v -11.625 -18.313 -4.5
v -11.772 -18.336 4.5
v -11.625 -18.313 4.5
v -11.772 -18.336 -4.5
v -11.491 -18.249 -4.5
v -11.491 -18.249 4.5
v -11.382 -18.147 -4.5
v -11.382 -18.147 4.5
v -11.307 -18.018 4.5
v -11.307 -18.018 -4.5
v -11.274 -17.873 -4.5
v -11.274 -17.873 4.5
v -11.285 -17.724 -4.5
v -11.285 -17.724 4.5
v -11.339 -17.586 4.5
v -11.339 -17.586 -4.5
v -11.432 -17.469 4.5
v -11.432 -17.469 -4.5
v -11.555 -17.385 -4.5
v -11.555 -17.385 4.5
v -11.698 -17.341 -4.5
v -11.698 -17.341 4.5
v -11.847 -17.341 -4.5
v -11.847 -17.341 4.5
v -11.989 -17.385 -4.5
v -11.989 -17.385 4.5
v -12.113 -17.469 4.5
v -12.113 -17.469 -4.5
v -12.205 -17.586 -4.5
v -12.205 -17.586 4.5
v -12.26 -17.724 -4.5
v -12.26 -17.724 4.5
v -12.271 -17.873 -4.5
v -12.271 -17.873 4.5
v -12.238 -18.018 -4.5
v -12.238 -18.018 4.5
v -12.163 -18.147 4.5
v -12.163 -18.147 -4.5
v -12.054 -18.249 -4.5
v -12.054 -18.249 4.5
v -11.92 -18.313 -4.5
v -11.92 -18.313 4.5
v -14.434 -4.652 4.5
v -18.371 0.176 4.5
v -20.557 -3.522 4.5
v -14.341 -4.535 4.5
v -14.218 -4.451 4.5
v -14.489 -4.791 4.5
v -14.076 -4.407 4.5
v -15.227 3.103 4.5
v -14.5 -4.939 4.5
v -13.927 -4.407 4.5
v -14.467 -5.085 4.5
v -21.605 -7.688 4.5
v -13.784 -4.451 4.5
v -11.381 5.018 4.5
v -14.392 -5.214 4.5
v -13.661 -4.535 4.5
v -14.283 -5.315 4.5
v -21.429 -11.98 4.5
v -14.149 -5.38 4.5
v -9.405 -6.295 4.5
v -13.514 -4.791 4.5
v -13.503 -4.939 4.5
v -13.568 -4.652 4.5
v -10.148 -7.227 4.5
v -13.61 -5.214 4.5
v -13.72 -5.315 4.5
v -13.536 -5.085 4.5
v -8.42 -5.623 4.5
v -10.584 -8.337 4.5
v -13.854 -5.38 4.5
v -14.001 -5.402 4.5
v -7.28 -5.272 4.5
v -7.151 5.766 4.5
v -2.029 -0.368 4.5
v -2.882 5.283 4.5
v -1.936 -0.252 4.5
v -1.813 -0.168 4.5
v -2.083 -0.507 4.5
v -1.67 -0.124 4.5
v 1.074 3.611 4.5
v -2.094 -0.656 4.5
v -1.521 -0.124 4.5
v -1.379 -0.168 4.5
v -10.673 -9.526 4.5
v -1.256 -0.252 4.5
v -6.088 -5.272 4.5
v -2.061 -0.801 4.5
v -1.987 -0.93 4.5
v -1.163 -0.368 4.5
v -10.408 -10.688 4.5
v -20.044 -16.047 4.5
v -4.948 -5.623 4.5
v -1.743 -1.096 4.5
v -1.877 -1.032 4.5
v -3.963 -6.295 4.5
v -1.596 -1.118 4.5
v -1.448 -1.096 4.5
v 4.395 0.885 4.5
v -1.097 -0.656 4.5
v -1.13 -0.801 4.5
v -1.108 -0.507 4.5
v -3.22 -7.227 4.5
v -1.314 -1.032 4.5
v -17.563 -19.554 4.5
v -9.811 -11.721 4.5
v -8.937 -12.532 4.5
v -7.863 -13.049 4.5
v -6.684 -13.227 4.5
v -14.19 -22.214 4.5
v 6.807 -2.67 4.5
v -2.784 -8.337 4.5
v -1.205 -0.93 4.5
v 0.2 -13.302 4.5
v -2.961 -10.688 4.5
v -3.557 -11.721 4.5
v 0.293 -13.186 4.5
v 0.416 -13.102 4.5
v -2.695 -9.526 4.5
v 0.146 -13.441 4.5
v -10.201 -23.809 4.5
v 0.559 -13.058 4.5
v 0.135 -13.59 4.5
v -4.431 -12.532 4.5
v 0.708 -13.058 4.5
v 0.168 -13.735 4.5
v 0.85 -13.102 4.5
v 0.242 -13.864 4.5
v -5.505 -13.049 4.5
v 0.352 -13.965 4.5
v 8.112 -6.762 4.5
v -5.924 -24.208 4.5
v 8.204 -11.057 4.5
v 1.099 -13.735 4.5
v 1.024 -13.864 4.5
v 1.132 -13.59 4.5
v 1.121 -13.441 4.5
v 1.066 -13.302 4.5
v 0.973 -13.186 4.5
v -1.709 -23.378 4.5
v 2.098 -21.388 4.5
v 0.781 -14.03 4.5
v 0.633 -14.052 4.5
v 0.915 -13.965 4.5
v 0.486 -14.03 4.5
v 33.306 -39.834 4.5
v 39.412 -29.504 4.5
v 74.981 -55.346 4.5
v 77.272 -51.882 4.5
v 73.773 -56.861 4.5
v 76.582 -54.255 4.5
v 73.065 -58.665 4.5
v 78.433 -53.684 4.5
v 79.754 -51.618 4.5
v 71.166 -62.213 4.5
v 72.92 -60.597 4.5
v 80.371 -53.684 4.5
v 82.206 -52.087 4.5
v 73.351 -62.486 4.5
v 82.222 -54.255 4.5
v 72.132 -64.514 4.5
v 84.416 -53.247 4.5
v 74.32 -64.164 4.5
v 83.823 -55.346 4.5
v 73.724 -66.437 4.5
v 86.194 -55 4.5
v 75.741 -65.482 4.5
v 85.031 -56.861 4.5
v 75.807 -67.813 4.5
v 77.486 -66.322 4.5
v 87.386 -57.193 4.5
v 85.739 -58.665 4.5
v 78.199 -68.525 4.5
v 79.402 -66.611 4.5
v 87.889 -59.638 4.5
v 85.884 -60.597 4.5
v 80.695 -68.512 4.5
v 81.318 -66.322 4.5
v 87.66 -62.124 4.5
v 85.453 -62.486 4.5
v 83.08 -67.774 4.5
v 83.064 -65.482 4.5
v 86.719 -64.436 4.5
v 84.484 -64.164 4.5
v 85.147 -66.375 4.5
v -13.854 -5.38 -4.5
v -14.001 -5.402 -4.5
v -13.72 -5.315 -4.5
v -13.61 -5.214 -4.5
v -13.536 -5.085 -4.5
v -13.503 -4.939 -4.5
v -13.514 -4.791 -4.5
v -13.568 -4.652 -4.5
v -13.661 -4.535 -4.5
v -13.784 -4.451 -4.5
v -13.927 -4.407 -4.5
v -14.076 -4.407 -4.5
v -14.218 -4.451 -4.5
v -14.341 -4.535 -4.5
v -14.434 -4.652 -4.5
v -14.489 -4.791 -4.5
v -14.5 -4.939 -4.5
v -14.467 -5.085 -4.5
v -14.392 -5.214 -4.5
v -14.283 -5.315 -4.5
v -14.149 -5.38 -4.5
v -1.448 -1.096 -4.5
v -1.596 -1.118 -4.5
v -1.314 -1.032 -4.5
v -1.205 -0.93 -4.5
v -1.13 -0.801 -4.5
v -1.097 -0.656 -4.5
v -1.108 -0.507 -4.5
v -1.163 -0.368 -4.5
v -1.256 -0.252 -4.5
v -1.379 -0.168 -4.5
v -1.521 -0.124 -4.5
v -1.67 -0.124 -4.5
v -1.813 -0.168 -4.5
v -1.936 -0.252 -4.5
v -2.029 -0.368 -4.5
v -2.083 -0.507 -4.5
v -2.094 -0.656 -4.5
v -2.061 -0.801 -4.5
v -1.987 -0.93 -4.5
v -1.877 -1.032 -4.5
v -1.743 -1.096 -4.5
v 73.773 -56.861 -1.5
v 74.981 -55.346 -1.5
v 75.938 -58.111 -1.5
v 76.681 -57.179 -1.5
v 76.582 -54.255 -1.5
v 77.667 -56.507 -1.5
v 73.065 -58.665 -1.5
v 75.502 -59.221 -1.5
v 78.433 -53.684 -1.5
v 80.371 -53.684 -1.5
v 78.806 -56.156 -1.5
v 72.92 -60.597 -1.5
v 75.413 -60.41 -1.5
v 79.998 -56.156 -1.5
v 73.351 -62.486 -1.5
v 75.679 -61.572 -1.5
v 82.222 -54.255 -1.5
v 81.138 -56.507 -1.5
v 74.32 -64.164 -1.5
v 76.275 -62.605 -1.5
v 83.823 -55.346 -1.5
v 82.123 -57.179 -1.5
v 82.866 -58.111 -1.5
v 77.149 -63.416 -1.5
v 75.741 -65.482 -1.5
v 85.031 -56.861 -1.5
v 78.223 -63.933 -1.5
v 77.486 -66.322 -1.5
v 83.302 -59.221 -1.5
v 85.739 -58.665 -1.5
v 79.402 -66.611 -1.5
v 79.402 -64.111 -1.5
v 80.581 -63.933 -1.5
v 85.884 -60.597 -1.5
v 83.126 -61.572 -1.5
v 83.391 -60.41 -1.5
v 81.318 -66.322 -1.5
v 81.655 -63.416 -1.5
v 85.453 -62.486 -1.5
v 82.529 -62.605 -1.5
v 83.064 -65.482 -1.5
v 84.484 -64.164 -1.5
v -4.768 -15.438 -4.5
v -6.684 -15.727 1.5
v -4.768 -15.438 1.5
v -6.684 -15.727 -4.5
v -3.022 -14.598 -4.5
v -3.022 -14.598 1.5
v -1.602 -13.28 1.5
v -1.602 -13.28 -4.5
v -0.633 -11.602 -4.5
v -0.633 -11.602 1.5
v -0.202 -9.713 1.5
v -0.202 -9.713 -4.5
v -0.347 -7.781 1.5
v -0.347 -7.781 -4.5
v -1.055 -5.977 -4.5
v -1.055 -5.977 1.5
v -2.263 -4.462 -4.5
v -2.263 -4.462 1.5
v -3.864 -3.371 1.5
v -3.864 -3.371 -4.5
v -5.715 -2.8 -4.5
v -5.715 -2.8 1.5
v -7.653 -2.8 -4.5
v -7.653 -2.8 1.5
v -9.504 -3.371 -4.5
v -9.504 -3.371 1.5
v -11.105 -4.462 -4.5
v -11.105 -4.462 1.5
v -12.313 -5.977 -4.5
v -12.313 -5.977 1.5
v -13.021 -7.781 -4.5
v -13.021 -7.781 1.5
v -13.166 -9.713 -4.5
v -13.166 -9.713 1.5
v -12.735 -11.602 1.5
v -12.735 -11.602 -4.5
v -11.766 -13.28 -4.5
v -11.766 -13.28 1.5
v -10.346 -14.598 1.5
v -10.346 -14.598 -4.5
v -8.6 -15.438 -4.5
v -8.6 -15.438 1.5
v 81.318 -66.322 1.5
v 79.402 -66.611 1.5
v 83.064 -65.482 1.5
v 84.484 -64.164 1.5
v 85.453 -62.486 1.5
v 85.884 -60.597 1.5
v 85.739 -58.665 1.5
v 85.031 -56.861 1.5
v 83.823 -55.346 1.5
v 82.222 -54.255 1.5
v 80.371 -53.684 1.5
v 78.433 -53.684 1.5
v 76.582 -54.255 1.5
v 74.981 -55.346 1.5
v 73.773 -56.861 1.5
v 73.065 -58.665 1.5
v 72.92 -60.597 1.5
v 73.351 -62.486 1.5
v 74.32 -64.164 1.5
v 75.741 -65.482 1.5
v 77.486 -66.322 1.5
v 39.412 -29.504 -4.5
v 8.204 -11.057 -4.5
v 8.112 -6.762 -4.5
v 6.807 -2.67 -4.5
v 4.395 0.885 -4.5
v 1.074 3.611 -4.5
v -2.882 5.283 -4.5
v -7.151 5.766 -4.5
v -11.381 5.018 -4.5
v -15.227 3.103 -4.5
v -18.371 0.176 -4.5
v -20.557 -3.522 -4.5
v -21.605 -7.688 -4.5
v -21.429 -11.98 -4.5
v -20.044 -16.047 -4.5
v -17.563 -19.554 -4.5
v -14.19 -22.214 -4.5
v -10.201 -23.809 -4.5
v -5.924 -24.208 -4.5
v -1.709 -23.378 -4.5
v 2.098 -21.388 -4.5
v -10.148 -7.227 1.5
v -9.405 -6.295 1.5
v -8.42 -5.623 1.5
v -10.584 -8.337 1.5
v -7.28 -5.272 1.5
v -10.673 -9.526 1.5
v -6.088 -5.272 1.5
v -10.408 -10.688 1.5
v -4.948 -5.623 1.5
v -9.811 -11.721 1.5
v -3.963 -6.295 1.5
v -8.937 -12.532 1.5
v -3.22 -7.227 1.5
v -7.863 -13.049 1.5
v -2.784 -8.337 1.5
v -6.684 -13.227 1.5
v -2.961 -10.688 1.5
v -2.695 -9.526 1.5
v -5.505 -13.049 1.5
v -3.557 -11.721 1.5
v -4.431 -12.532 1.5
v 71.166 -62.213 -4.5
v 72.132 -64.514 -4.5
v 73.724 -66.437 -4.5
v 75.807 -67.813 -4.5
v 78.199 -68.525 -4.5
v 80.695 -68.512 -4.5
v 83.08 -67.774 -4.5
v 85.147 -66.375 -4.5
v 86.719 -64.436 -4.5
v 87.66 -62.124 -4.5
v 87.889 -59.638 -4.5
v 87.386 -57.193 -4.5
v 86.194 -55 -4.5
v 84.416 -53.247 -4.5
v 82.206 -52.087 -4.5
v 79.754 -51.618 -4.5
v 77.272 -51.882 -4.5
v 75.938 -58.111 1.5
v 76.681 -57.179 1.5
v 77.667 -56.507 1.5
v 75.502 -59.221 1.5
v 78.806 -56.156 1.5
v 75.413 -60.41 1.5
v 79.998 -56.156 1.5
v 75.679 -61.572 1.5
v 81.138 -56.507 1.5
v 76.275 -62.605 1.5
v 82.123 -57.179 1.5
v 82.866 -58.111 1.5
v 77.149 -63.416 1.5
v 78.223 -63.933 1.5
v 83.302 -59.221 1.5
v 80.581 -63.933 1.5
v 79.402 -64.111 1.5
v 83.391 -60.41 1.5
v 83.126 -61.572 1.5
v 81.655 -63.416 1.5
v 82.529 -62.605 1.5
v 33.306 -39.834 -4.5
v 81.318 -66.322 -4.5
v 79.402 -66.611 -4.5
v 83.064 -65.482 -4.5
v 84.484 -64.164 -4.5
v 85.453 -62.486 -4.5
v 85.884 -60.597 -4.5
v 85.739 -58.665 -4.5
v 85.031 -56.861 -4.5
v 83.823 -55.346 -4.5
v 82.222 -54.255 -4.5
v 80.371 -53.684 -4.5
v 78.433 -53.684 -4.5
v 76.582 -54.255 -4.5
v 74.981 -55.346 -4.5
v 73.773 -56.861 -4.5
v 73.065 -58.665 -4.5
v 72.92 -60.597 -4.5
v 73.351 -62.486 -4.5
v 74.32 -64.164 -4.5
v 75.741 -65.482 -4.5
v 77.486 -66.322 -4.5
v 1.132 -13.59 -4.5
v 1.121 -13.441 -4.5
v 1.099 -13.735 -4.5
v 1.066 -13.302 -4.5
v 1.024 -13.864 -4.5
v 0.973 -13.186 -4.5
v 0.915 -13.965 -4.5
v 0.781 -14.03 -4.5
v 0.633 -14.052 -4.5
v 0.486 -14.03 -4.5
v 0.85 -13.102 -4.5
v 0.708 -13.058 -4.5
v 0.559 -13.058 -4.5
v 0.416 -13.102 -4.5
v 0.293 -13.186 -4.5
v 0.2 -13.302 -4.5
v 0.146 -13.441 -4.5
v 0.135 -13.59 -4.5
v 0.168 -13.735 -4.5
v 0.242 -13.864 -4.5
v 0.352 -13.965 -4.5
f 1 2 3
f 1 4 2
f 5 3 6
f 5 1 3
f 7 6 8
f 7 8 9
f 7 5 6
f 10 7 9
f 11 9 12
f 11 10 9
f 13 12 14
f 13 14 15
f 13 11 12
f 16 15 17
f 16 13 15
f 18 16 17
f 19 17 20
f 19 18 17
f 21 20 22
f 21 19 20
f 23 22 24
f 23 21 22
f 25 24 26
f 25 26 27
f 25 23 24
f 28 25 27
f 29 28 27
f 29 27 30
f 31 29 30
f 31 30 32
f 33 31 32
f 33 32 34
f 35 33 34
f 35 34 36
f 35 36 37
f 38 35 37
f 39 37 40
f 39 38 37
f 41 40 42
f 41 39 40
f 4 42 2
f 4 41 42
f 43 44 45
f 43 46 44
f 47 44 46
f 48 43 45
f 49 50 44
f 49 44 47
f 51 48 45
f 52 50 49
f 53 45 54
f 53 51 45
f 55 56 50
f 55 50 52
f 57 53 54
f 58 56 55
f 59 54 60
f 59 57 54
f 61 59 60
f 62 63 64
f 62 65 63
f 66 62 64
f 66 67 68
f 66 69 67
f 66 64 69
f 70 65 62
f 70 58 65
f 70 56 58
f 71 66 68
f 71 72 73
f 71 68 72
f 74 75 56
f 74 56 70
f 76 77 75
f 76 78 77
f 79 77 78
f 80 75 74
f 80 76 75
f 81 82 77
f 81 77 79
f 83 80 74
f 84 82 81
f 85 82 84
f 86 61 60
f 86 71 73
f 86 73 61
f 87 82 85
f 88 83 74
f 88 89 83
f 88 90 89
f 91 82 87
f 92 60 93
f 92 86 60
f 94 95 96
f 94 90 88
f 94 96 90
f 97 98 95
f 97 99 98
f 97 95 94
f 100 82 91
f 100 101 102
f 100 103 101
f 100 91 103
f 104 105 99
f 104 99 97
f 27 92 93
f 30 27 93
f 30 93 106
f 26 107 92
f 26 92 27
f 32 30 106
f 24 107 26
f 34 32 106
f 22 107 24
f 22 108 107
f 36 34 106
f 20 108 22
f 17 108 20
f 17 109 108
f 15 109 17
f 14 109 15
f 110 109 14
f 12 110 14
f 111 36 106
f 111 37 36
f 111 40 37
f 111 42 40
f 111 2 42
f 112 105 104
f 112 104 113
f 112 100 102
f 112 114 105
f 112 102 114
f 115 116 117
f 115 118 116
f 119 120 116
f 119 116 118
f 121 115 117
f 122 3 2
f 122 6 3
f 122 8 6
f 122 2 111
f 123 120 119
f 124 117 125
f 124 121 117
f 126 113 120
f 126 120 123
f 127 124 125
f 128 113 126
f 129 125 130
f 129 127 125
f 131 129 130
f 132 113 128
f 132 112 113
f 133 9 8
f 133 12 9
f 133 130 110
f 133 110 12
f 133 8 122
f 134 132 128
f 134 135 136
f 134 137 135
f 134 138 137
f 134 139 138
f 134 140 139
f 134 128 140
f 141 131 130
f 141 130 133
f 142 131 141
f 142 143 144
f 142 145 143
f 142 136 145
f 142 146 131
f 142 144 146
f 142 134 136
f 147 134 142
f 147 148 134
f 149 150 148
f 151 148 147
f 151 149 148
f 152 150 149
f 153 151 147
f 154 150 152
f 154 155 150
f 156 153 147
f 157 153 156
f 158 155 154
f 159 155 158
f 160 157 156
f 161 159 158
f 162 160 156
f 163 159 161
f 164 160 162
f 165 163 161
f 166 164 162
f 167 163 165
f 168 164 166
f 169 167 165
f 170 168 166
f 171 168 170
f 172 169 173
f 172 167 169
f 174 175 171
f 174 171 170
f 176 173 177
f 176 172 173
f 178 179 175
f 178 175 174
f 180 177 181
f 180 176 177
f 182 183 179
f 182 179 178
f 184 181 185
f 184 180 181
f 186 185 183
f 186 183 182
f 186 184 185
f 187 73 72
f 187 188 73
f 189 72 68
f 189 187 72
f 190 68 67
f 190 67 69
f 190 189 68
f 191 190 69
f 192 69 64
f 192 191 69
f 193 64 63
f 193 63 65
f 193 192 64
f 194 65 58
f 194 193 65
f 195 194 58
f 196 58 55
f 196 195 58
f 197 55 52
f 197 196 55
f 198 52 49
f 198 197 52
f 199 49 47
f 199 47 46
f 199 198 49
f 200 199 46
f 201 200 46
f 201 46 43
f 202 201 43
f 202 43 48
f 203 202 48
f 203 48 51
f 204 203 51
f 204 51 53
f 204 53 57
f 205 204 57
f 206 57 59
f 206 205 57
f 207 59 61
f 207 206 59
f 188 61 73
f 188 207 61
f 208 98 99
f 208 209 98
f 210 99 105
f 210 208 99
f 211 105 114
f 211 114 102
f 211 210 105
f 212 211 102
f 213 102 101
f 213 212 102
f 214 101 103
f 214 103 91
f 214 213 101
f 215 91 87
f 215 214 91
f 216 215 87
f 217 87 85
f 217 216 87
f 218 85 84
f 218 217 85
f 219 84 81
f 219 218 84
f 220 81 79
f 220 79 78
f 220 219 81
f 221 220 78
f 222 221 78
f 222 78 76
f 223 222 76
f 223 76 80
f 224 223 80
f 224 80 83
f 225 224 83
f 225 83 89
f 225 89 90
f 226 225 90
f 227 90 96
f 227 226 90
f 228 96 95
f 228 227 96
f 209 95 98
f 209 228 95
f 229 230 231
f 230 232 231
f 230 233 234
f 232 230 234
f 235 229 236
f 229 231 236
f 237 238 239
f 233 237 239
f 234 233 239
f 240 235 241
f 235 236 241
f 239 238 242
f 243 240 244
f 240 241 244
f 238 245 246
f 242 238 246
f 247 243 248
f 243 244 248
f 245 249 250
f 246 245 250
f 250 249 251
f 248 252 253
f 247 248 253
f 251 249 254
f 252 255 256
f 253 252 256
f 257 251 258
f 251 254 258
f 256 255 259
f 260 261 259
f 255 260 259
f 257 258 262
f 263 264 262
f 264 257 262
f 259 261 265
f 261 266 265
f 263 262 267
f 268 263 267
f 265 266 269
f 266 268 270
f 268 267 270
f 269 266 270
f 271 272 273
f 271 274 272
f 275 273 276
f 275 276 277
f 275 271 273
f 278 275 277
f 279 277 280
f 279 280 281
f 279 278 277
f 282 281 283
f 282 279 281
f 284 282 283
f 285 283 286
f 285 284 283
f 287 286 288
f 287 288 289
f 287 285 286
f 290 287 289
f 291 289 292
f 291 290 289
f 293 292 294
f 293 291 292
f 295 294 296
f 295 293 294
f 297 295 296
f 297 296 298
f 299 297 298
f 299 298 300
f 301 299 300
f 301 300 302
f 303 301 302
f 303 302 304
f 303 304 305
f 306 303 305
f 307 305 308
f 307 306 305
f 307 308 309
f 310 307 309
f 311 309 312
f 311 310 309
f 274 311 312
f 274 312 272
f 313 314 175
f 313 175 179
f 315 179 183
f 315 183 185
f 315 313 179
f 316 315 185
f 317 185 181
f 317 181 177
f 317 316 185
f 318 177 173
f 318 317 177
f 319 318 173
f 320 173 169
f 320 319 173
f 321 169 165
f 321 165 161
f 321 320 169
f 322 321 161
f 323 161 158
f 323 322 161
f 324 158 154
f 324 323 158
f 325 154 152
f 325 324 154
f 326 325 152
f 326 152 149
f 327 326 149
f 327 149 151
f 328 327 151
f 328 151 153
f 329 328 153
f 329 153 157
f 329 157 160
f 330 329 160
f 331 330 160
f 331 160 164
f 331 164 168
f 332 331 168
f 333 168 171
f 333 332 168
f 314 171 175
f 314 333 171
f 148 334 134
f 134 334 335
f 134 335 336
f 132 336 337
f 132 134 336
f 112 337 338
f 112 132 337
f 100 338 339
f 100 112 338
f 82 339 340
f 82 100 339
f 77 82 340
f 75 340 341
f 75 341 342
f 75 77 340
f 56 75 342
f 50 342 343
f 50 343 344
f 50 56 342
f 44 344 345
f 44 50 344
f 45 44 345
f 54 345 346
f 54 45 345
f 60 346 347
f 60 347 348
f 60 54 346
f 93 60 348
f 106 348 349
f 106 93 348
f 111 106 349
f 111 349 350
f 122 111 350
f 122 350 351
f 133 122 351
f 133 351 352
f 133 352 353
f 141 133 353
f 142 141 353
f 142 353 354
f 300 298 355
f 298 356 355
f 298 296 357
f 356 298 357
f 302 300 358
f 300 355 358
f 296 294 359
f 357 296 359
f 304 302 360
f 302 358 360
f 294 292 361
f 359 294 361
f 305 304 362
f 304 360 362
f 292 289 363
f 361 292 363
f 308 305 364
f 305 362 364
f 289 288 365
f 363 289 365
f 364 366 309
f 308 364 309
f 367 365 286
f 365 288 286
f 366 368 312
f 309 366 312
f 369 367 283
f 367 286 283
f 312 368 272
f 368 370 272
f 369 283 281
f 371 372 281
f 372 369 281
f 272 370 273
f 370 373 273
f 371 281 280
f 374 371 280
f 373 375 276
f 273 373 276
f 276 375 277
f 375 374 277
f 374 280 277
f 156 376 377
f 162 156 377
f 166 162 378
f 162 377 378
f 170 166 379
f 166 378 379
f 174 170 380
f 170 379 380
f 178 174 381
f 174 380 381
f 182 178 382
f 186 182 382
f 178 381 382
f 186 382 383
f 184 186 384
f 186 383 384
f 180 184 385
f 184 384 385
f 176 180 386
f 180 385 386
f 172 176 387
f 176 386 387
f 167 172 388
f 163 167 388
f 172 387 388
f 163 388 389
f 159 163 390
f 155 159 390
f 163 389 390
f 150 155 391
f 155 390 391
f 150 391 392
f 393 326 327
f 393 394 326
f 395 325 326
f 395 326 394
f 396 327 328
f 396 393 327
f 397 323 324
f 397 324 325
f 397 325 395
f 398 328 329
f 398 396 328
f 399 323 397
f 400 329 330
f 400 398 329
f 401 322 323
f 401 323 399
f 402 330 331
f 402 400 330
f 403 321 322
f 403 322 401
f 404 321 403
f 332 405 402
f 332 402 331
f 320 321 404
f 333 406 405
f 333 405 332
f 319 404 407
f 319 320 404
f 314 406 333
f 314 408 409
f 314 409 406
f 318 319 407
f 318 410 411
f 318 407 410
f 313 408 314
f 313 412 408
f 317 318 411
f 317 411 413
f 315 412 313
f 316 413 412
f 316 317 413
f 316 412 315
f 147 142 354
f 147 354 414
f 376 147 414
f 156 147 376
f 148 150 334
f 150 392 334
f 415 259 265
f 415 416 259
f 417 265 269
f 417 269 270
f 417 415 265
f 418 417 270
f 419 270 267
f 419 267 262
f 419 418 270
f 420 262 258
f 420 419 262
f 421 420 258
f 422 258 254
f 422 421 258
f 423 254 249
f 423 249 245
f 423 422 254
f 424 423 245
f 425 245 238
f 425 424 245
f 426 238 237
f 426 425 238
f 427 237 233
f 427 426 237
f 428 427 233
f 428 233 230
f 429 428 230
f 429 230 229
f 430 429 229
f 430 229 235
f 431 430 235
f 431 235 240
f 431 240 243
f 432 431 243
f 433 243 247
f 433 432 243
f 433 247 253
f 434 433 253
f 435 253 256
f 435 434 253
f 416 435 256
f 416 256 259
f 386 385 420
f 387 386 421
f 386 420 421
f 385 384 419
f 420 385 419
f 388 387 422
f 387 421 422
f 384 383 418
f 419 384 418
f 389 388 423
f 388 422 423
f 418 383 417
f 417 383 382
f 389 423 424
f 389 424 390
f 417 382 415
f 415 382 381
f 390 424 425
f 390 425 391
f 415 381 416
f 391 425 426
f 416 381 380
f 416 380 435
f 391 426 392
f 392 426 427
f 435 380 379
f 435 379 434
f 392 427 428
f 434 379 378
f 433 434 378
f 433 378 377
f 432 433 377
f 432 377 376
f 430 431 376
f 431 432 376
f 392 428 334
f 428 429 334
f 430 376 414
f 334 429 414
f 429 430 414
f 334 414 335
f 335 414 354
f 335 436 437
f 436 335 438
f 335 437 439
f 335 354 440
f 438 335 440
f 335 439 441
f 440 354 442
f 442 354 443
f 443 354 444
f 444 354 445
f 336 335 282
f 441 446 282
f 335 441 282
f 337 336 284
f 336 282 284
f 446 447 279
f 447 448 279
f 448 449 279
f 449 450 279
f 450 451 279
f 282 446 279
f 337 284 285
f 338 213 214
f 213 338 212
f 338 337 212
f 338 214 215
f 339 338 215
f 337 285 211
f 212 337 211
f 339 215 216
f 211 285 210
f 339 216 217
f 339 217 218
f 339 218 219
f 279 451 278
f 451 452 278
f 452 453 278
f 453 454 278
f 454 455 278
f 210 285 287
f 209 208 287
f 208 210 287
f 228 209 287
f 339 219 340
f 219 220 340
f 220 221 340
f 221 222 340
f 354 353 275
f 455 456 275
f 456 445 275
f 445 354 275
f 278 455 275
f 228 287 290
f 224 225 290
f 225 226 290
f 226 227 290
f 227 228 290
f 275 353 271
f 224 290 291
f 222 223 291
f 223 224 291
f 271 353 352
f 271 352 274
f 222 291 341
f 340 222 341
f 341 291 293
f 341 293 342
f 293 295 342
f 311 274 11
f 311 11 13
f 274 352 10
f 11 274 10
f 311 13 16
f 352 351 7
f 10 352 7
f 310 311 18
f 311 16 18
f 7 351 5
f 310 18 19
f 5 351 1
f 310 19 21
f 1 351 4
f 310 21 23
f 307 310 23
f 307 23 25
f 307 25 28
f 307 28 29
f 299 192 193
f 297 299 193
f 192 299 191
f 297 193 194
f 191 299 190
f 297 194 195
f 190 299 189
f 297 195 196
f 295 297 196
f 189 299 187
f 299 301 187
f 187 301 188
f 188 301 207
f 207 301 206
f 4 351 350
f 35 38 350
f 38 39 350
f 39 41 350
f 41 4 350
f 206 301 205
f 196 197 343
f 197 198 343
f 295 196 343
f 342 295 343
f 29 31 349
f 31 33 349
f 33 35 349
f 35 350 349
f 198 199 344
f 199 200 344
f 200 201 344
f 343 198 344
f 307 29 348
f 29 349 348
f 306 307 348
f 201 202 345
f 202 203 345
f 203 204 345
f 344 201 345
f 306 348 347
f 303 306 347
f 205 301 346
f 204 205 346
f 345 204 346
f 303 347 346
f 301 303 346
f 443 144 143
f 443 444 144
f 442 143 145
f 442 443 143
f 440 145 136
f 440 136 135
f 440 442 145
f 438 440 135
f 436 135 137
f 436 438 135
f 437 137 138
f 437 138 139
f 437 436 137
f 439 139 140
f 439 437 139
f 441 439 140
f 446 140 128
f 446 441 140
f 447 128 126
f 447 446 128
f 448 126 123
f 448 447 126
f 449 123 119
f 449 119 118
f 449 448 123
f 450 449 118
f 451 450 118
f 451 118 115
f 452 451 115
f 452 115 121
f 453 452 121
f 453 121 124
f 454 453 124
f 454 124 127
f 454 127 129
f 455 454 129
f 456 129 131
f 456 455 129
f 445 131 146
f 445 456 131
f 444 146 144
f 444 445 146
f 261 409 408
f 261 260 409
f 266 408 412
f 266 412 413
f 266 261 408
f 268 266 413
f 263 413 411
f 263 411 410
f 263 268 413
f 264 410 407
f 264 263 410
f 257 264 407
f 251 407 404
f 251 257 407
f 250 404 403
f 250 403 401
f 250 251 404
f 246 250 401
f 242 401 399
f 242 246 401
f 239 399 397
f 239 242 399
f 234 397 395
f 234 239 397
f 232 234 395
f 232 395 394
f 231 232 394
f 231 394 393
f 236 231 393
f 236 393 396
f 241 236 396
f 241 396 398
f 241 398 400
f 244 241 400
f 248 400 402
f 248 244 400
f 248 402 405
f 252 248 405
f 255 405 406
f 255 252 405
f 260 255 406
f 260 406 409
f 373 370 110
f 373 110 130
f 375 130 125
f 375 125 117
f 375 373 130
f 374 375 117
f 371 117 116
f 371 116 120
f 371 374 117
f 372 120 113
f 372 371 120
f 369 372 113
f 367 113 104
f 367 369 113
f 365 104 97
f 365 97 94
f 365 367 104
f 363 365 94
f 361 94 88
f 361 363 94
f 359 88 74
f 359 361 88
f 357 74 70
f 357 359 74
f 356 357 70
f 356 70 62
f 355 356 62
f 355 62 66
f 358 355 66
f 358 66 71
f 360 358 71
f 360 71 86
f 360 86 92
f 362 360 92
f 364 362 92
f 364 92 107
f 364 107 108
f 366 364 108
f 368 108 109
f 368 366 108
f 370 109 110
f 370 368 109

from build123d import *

# Parameters (mm, degrees)
SKETCH2_R           = 8.5
SKETCH2_R_2         = 6.5
SKETCH2_R_3         = 15
SKETCH2_R_4         = 0.5
BOSS_EXTRUDE2_DEPTH = 4.5
BOSS_EXTRUDE8_START = 1.5
SKETCH2_13_R        = 6.5
SKETCH2_13_R_2      = 4
BOSS_EXTRUDE8_DEPTH = 3
SKETCH2_7_R         = 6.5
SKETCH2_7_R_2       = 4
BOSS_EXTRUDE5_DEPTH = 1.5


with BuildPart() as part:
    # Sketch2 → Boss-Extrude2 (new, symmetric)
    # profile 1 of 3: a face of its own
    with BuildSketch(Plane(origin=(-406.338605642, -287.966071976, 0), x_dir=(-0.7121905836143565, 0.7019861626920024, 0), z_dir=(0, 0, 1))):
        with BuildLine():
            ThreePointArc((-177.488840527, -503.259500631), (-177.796019748, -505.523940447), (-178.695355275, -507.624712296))
            Line((-178.695355275, -507.624712296), (-136.02252284, -496.985180209))
            Line((-136.02252284, -496.985180209), (-100.847097363, -488.214961626))
            ThreePointArc((-100.847097363, -488.214961626), (-103.513703794, -482.696139506), (-103.75016011, -476.57141291))
            Line((-103.75016011, -476.57141291), (-138.925585587, -485.341631494))
            Line((-138.925585587, -485.341631494), (-181.598418022, -495.981163581))
            ThreePointArc((-181.598418022, -495.981163581), (-178.587199112, -499.080301623), (-177.488840527, -503.259500631))
        make_face()
    # profile 2 of 3: a face of its own
    with BuildSketch(Plane(origin=(-406.338605642, -287.966071976, 0), x_dir=(-0.7121905836143565, 0.7019861626920024, 0), z_dir=(0, 0, 1))):
        with Locations((-185.988840527, -503.259500631)):
            Circle(SKETCH2_R)
        with Locations(Location((-185.988840527, -503.259500631, 0), (0, 0, 134.586572113))):
            Circle(SKETCH2_R_2, mode=Mode.SUBTRACT)
    # profile 3 of 3: a face of its own
    with BuildSketch(Plane(origin=(-406.338605642, -287.966071976, 0), x_dir=(-0.7121905836143565, 0.7019861626920024, 0), z_dir=(0, 0, 1))):
        with Locations((-88.9592679, -479.067311072)):
            Circle(SKETCH2_R_3)
        with Locations(Location((-88.9592679, -479.067311072, 0), (0, 0, 134.586572113))):
            Circle(SKETCH2_R_2, mode=Mode.SUBTRACT)
        with Locations(Location((-80.711754227, -477.010974959, 0), (0, 0, 134.586572113))):
            Circle(SKETCH2_R_4, mode=Mode.SUBTRACT)
        with Locations(Location((-97.206781573, -481.123647184, 0), (0, 0, 134.586572113))):
            Circle(SKETCH2_R_4, mode=Mode.SUBTRACT)
        with Locations(Location((-86.540048944, -488.770268334, 0), (0, 0, 134.586572113))):
            Circle(SKETCH2_R_4, mode=Mode.SUBTRACT)
        with Locations(Location((-91.378486856, -469.364353809, 0), (0, 0, 134.586572113))):
            Circle(SKETCH2_R_4, mode=Mode.SUBTRACT)
    extrude(amount=BOSS_EXTRUDE2_DEPTH, both=True)

    # Sketch2<13> → Boss-Extrude8 (add)
    with BuildSketch(Plane(origin=(-406.338605642, -287.966071976, 0), x_dir=(-0.7121905836143565, 0.7019861626920024, 0), z_dir=(0, 0, 1)).offset(BOSS_EXTRUDE8_START)):
        with Locations(Location((-88.9592679, -479.067311072, 0), (0, 0, 134.586572113))):
            Circle(SKETCH2_13_R)
        with Locations(Location((-88.9592679, -479.067311072, 0), (0, 0, 134.586572113))):
            Circle(SKETCH2_13_R_2, mode=Mode.SUBTRACT)
    extrude(amount=BOSS_EXTRUDE8_DEPTH)

    # Sketch2<7> → Boss-Extrude5 (add, symmetric)
    with BuildSketch(Plane(origin=(-406.338605642, -287.966071976, 0), x_dir=(-0.7121905836143565, 0.7019861626920024, 0), z_dir=(0, 0, 1))):
        with Locations(Location((-185.988840527, -503.259500631, 0), (0, 0, 134.586572113))):
            Circle(SKETCH2_7_R)
        with Locations(Location((-185.988840527, -503.259500631, 0), (0, 0, 134.586572113))):
            Circle(SKETCH2_7_R_2, mode=Mode.SUBTRACT)
    extrude(amount=BOSS_EXTRUDE5_DEPTH, both=True)


solid = part.part
